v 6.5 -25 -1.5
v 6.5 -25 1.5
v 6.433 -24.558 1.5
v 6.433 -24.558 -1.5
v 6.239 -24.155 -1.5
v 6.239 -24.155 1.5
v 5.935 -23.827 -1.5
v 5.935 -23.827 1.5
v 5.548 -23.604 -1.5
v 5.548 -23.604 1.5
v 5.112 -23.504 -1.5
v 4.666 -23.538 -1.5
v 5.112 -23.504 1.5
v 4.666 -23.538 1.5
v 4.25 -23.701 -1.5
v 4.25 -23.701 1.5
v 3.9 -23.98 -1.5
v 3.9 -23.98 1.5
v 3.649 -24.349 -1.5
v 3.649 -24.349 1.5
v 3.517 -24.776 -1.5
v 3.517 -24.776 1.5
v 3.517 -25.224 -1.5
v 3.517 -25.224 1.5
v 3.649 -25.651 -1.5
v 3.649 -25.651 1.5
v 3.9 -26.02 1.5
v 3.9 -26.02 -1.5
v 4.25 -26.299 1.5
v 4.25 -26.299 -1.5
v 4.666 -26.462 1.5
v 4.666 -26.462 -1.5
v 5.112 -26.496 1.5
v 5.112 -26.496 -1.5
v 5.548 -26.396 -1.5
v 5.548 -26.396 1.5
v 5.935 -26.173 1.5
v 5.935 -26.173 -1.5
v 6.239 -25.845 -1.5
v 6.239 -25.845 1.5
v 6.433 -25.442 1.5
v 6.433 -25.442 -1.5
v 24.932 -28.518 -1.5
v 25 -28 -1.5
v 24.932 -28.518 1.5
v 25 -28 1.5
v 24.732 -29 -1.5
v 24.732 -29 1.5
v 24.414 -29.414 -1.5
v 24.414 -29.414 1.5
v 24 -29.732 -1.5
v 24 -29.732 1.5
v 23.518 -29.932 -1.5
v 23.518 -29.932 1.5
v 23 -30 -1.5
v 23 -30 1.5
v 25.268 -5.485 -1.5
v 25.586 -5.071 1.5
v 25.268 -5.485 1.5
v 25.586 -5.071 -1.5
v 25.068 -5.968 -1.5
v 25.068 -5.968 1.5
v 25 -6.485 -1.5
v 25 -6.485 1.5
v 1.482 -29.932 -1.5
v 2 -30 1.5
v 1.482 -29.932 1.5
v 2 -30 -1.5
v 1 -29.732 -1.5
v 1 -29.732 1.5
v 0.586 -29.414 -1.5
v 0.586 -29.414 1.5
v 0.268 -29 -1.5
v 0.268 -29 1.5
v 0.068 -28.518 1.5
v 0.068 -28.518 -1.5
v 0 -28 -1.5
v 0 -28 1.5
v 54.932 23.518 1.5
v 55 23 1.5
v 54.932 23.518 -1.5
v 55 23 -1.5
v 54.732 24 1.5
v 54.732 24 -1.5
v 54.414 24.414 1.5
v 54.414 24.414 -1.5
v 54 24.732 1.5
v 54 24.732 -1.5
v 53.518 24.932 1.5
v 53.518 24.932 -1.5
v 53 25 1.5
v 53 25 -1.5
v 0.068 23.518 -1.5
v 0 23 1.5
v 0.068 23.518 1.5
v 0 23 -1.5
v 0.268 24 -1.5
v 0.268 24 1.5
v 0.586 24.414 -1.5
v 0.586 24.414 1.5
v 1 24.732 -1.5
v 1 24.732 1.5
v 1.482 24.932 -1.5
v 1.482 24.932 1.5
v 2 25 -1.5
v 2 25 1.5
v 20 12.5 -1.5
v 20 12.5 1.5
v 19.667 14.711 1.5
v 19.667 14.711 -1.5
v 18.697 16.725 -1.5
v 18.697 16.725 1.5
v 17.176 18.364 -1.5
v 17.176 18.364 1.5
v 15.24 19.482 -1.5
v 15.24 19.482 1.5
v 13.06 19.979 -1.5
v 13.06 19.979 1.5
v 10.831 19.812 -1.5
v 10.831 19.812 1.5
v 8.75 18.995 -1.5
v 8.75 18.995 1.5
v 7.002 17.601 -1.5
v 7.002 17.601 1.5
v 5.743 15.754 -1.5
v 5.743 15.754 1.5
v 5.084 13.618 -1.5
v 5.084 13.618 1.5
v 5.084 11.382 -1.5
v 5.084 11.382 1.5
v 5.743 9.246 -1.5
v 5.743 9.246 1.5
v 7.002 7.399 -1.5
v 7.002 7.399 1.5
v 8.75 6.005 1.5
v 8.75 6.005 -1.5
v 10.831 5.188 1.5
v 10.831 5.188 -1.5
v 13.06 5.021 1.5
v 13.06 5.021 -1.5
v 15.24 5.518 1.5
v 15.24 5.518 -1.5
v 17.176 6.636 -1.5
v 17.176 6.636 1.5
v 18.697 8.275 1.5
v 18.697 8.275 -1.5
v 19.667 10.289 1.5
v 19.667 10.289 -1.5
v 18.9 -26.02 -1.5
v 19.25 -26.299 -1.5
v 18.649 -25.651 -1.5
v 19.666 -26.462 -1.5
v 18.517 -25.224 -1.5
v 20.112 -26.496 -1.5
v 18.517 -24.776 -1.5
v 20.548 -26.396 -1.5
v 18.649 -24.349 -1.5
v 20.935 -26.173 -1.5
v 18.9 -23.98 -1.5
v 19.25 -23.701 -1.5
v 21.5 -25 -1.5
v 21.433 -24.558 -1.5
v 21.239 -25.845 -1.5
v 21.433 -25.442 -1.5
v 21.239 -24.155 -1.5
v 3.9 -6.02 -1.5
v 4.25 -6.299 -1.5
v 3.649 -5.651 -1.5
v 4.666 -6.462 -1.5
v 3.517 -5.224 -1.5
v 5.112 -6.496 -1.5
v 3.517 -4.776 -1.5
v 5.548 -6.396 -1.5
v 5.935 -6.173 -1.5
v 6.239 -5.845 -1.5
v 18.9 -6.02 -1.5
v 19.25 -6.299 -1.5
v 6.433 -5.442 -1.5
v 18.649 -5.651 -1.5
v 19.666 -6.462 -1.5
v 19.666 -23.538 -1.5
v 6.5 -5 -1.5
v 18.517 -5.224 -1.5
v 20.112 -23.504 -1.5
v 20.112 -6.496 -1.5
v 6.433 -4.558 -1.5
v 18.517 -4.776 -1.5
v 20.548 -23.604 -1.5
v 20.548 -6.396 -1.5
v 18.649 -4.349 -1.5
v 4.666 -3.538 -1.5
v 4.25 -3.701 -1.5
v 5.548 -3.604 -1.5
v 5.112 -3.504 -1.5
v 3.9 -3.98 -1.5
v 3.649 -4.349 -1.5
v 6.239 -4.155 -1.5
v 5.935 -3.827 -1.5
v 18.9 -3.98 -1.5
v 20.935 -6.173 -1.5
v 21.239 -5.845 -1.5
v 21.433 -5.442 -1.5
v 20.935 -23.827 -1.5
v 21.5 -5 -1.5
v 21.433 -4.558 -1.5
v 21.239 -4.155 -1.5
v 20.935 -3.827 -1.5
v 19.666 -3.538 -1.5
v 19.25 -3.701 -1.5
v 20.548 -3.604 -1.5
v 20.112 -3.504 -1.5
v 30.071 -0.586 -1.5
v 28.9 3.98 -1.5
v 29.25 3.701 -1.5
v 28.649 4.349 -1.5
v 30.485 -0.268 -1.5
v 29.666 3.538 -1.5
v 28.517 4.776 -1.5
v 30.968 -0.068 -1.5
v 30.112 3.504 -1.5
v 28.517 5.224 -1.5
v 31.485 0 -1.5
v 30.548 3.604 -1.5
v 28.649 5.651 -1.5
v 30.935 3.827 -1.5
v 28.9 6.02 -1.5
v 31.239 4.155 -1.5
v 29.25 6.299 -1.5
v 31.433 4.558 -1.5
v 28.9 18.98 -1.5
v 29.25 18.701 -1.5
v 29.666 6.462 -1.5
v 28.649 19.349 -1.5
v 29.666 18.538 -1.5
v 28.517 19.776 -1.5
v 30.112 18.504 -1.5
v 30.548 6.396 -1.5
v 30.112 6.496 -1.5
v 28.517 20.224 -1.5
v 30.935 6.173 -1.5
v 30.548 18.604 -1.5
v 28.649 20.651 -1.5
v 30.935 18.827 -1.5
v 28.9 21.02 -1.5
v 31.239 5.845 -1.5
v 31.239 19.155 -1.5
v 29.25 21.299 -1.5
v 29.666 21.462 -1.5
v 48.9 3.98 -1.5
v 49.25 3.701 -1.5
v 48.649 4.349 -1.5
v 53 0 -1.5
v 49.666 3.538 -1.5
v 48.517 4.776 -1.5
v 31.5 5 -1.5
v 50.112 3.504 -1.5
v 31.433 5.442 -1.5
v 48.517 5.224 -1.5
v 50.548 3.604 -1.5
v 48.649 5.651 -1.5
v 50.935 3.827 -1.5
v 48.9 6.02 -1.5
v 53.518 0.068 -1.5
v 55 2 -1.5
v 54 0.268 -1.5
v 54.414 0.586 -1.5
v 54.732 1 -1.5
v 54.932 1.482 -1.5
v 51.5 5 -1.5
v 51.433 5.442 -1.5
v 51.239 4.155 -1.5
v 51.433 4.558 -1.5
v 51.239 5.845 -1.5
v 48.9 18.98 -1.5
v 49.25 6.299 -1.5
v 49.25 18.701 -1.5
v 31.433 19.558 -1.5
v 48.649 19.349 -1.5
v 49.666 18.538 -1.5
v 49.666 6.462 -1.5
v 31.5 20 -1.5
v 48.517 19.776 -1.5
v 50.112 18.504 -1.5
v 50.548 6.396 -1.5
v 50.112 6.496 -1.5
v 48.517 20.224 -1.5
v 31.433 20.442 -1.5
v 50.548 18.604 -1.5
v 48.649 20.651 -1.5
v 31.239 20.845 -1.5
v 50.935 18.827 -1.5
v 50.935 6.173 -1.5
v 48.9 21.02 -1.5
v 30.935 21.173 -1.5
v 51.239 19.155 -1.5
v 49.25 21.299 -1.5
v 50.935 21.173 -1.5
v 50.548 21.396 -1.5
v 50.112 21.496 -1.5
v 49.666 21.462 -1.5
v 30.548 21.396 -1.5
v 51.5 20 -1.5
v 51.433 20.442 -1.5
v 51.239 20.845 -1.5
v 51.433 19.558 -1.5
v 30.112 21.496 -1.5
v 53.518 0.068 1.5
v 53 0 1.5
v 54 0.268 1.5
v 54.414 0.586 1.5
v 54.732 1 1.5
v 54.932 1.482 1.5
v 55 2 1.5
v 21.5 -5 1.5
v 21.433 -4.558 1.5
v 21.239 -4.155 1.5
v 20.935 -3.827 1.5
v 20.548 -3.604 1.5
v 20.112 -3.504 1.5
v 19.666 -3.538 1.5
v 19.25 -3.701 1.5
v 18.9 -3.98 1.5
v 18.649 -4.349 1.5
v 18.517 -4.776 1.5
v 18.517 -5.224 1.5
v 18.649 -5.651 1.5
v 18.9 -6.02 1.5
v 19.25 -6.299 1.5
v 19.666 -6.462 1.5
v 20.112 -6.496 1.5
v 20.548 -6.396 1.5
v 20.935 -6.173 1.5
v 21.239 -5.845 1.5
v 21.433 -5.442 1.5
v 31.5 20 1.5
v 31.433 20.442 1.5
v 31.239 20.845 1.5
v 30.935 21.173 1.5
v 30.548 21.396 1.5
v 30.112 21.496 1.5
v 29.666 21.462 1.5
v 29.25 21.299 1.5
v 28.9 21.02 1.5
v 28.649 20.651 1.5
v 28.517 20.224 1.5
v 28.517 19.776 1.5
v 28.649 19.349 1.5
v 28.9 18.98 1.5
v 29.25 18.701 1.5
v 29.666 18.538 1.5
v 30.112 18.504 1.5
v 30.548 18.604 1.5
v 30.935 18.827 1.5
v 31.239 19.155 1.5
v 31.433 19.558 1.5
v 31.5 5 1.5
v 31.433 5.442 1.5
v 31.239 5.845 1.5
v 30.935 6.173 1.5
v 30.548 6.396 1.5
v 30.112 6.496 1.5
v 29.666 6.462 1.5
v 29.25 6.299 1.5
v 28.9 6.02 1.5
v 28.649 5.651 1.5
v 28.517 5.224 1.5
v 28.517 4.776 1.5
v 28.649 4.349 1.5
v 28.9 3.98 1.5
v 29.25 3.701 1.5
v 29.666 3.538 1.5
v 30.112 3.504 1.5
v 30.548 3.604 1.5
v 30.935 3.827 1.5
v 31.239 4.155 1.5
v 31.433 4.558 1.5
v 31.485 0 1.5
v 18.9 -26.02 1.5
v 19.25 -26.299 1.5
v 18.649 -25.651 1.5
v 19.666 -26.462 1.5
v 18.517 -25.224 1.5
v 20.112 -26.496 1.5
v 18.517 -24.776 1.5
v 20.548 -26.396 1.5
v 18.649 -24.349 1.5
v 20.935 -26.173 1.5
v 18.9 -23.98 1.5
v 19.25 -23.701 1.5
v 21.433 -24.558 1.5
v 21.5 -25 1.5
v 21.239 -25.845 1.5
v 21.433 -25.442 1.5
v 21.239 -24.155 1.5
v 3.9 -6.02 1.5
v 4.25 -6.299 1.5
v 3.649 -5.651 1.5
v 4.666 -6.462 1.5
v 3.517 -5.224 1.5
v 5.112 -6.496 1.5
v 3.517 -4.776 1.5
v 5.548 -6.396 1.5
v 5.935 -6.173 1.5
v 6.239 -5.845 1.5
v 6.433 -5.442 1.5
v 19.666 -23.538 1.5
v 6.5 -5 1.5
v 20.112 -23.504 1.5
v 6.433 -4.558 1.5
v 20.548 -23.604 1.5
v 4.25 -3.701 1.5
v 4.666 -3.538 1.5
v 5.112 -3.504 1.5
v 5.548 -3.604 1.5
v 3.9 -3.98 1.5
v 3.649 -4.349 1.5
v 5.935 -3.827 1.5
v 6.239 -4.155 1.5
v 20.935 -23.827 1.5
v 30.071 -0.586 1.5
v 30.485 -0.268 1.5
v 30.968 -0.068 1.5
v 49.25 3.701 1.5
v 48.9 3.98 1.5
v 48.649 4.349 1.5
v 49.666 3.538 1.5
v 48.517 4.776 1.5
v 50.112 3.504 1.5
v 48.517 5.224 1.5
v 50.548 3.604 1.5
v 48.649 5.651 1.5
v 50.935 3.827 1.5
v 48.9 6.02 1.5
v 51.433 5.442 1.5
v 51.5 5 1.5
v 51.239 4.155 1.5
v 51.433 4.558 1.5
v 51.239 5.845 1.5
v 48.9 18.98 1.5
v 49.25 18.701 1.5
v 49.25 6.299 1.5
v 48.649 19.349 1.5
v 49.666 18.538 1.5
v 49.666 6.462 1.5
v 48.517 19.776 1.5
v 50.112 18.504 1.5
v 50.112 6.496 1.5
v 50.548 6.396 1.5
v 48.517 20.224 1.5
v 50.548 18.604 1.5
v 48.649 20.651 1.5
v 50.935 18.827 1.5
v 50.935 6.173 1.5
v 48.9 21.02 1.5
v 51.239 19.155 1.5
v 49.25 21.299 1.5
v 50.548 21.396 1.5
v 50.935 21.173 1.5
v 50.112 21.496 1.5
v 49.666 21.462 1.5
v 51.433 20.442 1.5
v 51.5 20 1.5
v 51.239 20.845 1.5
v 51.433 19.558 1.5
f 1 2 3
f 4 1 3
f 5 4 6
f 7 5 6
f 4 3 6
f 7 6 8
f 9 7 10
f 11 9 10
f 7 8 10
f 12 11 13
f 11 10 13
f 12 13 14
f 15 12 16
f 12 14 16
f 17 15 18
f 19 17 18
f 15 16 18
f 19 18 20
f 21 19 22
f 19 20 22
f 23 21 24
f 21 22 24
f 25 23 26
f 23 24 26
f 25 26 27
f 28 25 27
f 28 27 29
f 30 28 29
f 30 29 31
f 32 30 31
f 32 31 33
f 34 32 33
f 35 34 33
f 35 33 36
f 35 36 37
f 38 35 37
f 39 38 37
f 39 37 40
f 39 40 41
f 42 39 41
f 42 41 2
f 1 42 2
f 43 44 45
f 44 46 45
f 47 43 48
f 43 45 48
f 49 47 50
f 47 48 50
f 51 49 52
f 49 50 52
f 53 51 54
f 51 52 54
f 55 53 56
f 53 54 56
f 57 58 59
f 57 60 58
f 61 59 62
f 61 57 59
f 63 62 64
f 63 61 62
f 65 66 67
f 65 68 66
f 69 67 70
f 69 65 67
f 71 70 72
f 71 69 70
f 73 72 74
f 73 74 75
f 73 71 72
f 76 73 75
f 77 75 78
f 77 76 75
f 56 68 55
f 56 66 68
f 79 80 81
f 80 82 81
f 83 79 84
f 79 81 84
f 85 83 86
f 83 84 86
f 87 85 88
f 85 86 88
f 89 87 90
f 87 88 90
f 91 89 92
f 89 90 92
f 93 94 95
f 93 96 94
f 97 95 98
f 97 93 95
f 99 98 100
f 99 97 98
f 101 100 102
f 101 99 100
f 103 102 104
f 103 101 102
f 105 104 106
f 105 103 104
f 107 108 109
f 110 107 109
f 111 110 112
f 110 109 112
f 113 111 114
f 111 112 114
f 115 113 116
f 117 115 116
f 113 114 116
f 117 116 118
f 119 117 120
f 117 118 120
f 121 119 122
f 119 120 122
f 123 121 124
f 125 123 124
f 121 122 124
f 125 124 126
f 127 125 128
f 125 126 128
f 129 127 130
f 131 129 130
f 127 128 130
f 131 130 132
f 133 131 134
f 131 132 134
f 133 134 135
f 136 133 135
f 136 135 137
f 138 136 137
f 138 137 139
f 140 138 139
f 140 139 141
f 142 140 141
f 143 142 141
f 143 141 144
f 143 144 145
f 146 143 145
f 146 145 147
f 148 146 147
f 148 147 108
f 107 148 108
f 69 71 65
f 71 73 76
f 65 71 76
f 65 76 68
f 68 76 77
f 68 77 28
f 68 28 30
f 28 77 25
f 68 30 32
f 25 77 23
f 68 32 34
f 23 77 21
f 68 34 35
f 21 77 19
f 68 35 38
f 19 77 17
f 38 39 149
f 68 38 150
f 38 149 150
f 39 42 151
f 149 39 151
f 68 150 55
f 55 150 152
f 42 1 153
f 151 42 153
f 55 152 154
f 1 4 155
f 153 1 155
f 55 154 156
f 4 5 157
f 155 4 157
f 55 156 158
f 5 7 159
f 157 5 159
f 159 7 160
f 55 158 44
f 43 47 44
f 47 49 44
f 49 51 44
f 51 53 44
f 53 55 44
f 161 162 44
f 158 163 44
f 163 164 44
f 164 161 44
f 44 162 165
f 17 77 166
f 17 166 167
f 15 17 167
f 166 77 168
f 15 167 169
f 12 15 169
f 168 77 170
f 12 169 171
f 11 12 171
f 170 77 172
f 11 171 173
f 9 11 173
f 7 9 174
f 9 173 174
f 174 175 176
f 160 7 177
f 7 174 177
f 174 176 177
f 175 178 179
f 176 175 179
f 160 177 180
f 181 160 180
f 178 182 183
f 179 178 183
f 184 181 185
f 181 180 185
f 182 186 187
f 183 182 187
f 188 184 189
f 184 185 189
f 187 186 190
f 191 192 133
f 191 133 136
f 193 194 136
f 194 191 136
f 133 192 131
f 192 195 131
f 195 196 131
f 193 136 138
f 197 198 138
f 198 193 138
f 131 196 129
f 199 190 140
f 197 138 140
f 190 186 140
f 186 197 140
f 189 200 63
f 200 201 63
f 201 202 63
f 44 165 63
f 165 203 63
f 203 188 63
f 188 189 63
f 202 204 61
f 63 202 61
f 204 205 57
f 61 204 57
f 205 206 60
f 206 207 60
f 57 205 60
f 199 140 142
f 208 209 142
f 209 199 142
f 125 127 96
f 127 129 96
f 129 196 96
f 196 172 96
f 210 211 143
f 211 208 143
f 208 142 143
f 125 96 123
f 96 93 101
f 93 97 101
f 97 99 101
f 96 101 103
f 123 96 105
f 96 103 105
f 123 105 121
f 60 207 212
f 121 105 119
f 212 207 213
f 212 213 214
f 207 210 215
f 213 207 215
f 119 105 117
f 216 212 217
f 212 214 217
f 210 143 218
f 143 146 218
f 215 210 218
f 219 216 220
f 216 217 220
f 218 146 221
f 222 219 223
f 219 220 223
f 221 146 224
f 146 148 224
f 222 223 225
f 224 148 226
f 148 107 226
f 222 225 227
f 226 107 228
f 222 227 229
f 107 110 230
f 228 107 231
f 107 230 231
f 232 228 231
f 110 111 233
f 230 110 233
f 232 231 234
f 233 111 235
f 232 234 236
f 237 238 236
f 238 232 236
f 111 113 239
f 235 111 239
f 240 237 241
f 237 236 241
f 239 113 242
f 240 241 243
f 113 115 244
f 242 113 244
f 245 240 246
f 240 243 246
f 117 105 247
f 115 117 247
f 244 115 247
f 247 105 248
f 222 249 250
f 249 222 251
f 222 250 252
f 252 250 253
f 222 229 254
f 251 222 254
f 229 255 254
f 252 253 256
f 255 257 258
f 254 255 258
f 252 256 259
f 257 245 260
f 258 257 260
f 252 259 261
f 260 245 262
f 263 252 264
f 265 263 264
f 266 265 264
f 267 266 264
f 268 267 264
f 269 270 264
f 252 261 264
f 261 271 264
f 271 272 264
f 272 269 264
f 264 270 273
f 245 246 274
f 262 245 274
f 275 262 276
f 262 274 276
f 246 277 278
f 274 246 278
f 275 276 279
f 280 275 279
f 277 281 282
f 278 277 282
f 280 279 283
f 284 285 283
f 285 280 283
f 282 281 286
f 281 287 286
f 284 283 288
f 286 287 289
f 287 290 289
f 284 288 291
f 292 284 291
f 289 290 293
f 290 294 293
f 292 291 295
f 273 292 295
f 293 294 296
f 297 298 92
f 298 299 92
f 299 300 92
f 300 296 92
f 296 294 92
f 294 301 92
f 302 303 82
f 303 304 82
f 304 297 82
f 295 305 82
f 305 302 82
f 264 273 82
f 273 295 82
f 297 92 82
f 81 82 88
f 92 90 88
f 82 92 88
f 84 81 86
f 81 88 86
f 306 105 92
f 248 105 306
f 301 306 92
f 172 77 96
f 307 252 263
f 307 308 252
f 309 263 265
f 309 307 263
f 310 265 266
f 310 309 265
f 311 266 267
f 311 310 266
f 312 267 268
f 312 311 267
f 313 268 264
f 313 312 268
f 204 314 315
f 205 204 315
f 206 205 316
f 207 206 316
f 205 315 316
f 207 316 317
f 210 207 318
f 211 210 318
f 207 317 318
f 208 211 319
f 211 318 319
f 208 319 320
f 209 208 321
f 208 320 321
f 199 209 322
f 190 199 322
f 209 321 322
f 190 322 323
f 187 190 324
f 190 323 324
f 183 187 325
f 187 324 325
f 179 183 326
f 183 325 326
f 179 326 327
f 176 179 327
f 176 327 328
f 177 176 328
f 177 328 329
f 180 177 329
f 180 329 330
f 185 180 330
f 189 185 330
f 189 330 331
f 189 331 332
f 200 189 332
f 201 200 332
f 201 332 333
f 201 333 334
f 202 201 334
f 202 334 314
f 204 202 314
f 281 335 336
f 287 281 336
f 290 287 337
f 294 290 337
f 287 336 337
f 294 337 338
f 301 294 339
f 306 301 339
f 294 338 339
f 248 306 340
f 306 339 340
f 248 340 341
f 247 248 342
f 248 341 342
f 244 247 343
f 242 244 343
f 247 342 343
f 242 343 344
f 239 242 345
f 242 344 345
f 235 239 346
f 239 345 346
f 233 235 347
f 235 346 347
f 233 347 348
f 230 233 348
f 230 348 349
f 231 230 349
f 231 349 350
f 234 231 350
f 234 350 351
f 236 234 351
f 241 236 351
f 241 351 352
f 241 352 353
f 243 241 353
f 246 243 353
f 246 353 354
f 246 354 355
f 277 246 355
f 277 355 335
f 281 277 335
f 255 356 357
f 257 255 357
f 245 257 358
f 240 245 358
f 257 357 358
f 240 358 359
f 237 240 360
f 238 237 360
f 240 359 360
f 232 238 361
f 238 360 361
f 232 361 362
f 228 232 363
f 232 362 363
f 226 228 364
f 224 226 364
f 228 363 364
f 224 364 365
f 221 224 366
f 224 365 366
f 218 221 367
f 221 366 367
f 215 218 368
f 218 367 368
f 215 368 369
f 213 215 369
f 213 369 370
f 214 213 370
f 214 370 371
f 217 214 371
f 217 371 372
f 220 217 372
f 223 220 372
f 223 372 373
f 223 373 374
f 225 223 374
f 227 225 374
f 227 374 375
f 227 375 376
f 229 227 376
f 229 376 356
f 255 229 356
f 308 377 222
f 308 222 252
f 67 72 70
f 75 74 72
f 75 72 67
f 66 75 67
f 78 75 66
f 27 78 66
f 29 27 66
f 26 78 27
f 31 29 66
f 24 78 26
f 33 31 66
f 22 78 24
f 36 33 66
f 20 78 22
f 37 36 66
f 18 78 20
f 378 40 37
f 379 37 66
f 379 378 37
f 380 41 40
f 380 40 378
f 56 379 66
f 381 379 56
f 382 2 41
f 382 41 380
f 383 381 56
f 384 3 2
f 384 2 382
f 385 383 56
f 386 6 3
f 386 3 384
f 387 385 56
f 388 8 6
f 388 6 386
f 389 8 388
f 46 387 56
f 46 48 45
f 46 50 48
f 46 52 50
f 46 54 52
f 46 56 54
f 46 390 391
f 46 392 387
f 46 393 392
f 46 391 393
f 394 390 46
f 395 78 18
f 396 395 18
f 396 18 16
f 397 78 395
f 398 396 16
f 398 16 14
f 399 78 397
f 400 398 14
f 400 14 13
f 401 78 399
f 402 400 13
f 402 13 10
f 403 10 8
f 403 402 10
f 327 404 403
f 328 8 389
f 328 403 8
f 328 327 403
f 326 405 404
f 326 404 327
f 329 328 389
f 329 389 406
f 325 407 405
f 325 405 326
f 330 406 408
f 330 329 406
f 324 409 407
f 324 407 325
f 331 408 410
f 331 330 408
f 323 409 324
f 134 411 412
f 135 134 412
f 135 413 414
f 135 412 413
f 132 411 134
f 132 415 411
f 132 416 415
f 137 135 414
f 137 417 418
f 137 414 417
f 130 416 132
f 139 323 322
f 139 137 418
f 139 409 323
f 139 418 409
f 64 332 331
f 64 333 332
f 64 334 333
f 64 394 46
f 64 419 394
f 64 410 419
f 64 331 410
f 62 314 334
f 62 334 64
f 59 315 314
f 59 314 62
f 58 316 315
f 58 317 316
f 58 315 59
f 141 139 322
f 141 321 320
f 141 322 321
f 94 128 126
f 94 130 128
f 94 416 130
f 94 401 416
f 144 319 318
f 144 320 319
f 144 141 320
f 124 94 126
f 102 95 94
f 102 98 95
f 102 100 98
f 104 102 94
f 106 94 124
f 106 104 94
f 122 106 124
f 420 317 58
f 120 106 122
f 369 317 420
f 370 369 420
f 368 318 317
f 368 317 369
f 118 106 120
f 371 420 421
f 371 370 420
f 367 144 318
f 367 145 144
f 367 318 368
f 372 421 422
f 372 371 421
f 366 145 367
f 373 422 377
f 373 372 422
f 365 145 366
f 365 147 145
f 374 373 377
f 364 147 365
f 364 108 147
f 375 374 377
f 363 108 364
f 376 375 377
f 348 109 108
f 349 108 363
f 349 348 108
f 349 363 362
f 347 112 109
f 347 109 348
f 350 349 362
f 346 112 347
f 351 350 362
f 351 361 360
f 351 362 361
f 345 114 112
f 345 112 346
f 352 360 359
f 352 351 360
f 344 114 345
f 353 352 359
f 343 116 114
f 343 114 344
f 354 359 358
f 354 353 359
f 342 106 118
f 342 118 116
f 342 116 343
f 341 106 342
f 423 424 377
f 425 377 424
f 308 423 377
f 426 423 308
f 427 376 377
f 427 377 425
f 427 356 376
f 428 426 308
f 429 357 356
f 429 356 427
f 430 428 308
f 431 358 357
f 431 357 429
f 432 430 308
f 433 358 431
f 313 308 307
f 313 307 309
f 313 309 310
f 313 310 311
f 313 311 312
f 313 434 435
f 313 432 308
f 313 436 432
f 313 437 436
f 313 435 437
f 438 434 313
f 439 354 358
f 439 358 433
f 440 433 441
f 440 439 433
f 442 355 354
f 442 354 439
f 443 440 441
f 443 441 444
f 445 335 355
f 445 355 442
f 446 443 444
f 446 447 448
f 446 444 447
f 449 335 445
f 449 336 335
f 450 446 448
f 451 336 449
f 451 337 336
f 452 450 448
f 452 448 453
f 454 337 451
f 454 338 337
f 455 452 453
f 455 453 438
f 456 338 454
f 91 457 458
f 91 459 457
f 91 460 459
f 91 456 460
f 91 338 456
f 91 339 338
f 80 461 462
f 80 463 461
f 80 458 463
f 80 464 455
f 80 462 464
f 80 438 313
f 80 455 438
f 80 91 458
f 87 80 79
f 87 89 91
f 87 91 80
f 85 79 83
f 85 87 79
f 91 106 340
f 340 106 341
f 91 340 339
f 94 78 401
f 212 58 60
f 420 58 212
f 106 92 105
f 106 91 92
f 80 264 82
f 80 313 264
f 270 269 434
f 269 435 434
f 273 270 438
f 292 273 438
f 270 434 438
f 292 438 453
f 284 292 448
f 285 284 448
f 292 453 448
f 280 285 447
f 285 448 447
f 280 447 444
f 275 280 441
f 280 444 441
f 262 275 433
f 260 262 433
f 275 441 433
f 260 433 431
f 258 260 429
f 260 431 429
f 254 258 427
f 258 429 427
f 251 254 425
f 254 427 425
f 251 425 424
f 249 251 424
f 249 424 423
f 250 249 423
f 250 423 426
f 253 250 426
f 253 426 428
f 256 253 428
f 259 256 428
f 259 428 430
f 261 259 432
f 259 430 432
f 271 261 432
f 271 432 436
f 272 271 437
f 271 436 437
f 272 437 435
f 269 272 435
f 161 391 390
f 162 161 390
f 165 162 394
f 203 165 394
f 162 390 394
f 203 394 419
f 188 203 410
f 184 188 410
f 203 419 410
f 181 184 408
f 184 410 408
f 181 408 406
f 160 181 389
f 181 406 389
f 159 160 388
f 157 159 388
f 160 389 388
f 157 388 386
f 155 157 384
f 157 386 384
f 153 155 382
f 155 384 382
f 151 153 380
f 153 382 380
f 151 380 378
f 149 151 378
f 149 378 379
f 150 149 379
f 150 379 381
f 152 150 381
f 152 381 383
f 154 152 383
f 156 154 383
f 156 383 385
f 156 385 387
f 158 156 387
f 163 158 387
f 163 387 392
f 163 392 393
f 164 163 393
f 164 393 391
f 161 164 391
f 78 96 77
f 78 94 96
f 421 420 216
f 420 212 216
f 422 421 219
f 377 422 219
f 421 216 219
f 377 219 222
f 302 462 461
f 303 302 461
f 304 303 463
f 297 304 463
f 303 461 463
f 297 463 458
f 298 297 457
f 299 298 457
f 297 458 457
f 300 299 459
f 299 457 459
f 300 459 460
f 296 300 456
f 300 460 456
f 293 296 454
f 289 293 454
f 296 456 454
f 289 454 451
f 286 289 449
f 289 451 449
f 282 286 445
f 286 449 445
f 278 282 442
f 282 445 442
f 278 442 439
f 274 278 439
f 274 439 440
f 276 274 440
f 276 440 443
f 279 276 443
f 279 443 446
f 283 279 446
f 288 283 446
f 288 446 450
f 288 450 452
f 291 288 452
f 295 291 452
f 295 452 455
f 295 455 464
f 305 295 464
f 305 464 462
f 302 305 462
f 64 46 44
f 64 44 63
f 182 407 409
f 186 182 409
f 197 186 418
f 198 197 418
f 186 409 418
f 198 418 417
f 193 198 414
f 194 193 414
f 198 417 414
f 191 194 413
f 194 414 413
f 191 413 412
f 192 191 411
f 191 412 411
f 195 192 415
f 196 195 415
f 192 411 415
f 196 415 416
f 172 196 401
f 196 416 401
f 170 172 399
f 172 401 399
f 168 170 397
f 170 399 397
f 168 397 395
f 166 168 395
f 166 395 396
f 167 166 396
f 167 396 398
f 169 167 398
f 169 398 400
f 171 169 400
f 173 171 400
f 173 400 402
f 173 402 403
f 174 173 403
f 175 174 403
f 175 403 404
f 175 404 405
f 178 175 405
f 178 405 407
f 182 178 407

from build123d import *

# Parameters (mm, degrees)
SKETCH_1_W          = 25
SKETCH_1_H          = 30
EXTRUDE_1_DEPTH     = 1.5
SKETCH_2_R          = 1.5
CUT_EXTRUDE_1_DEPTH = 21.5
EXTRUDE_2_DEPTH     = 3
FILLET_1_R          = 2
SKETCH_4_R          = 7.5
CUT_EXTRUDE_2_DEPTH = 10


with BuildPart() as part:
    # 草图1 → 凸台-拉伸1 (new, symmetric)
    with BuildSketch(Plane.XY):
        with Locations((12.5, -15)):
            Rectangle(SKETCH_1_W, SKETCH_1_H)
        Polygon((0, 25), (0, 0), (25, 0), (55, 0), (55, 25), align=None)
    extrude(amount=EXTRUDE_1_DEPTH, both=True)

    # 草图2 → 切除-拉伸1 (cut, symmetric)
    with BuildSketch(Plane.XY.offset(1.5)):
        with Locations((20, -25)):
            Circle(SKETCH_2_R)
        with Locations((5, -25)):
            Circle(SKETCH_2_R)
        with Locations((5, -5)):
            Circle(SKETCH_2_R)
        with Locations((20, -5)):
            Circle(SKETCH_2_R)
        with Locations((30, 5)):
            Circle(SKETCH_2_R)
        with Locations((30, 20)):
            Circle(SKETCH_2_R)
        with Locations((50, 20)):
            Circle(SKETCH_2_R)
        with Locations((50, 5)):
            Circle(SKETCH_2_R)
    extrude(amount=CUT_EXTRUDE_1_DEPTH, both=True, mode=Mode.SUBTRACT)

    # 草图3 → 凸台-拉伸2 (add)
    with BuildSketch(Plane.XY.offset(1.5)):
        Polygon((25, -5.656854249), (30.656854249, 0), (25, 0), align=None)
    extrude(amount=-EXTRUDE_2_DEPTH)

    # 圆角1
    fillet_1_edges = [part.edges().sort_by_distance(p)[0] for p in [
        (25, -30, 0),
        (0, -30, 0),
        (0, 25, 0),
        (55, 25, 0),
        (55, 0, 0),
        (25, -5.656854249, 0),
        (30.656854249, 0, 0),
    ]]
    fillet(fillet_1_edges, radius=FILLET_1_R)

    # 草图4 → 切除-拉伸2 (cut)
    with BuildSketch(Plane.XY.offset(1.5)):
        with Locations((12.5, 12.5)):
            Circle(SKETCH_4_R)
    extrude(amount=-CUT_EXTRUDE_2_DEPTH, mode=Mode.SUBTRACT)


solid = part.part
